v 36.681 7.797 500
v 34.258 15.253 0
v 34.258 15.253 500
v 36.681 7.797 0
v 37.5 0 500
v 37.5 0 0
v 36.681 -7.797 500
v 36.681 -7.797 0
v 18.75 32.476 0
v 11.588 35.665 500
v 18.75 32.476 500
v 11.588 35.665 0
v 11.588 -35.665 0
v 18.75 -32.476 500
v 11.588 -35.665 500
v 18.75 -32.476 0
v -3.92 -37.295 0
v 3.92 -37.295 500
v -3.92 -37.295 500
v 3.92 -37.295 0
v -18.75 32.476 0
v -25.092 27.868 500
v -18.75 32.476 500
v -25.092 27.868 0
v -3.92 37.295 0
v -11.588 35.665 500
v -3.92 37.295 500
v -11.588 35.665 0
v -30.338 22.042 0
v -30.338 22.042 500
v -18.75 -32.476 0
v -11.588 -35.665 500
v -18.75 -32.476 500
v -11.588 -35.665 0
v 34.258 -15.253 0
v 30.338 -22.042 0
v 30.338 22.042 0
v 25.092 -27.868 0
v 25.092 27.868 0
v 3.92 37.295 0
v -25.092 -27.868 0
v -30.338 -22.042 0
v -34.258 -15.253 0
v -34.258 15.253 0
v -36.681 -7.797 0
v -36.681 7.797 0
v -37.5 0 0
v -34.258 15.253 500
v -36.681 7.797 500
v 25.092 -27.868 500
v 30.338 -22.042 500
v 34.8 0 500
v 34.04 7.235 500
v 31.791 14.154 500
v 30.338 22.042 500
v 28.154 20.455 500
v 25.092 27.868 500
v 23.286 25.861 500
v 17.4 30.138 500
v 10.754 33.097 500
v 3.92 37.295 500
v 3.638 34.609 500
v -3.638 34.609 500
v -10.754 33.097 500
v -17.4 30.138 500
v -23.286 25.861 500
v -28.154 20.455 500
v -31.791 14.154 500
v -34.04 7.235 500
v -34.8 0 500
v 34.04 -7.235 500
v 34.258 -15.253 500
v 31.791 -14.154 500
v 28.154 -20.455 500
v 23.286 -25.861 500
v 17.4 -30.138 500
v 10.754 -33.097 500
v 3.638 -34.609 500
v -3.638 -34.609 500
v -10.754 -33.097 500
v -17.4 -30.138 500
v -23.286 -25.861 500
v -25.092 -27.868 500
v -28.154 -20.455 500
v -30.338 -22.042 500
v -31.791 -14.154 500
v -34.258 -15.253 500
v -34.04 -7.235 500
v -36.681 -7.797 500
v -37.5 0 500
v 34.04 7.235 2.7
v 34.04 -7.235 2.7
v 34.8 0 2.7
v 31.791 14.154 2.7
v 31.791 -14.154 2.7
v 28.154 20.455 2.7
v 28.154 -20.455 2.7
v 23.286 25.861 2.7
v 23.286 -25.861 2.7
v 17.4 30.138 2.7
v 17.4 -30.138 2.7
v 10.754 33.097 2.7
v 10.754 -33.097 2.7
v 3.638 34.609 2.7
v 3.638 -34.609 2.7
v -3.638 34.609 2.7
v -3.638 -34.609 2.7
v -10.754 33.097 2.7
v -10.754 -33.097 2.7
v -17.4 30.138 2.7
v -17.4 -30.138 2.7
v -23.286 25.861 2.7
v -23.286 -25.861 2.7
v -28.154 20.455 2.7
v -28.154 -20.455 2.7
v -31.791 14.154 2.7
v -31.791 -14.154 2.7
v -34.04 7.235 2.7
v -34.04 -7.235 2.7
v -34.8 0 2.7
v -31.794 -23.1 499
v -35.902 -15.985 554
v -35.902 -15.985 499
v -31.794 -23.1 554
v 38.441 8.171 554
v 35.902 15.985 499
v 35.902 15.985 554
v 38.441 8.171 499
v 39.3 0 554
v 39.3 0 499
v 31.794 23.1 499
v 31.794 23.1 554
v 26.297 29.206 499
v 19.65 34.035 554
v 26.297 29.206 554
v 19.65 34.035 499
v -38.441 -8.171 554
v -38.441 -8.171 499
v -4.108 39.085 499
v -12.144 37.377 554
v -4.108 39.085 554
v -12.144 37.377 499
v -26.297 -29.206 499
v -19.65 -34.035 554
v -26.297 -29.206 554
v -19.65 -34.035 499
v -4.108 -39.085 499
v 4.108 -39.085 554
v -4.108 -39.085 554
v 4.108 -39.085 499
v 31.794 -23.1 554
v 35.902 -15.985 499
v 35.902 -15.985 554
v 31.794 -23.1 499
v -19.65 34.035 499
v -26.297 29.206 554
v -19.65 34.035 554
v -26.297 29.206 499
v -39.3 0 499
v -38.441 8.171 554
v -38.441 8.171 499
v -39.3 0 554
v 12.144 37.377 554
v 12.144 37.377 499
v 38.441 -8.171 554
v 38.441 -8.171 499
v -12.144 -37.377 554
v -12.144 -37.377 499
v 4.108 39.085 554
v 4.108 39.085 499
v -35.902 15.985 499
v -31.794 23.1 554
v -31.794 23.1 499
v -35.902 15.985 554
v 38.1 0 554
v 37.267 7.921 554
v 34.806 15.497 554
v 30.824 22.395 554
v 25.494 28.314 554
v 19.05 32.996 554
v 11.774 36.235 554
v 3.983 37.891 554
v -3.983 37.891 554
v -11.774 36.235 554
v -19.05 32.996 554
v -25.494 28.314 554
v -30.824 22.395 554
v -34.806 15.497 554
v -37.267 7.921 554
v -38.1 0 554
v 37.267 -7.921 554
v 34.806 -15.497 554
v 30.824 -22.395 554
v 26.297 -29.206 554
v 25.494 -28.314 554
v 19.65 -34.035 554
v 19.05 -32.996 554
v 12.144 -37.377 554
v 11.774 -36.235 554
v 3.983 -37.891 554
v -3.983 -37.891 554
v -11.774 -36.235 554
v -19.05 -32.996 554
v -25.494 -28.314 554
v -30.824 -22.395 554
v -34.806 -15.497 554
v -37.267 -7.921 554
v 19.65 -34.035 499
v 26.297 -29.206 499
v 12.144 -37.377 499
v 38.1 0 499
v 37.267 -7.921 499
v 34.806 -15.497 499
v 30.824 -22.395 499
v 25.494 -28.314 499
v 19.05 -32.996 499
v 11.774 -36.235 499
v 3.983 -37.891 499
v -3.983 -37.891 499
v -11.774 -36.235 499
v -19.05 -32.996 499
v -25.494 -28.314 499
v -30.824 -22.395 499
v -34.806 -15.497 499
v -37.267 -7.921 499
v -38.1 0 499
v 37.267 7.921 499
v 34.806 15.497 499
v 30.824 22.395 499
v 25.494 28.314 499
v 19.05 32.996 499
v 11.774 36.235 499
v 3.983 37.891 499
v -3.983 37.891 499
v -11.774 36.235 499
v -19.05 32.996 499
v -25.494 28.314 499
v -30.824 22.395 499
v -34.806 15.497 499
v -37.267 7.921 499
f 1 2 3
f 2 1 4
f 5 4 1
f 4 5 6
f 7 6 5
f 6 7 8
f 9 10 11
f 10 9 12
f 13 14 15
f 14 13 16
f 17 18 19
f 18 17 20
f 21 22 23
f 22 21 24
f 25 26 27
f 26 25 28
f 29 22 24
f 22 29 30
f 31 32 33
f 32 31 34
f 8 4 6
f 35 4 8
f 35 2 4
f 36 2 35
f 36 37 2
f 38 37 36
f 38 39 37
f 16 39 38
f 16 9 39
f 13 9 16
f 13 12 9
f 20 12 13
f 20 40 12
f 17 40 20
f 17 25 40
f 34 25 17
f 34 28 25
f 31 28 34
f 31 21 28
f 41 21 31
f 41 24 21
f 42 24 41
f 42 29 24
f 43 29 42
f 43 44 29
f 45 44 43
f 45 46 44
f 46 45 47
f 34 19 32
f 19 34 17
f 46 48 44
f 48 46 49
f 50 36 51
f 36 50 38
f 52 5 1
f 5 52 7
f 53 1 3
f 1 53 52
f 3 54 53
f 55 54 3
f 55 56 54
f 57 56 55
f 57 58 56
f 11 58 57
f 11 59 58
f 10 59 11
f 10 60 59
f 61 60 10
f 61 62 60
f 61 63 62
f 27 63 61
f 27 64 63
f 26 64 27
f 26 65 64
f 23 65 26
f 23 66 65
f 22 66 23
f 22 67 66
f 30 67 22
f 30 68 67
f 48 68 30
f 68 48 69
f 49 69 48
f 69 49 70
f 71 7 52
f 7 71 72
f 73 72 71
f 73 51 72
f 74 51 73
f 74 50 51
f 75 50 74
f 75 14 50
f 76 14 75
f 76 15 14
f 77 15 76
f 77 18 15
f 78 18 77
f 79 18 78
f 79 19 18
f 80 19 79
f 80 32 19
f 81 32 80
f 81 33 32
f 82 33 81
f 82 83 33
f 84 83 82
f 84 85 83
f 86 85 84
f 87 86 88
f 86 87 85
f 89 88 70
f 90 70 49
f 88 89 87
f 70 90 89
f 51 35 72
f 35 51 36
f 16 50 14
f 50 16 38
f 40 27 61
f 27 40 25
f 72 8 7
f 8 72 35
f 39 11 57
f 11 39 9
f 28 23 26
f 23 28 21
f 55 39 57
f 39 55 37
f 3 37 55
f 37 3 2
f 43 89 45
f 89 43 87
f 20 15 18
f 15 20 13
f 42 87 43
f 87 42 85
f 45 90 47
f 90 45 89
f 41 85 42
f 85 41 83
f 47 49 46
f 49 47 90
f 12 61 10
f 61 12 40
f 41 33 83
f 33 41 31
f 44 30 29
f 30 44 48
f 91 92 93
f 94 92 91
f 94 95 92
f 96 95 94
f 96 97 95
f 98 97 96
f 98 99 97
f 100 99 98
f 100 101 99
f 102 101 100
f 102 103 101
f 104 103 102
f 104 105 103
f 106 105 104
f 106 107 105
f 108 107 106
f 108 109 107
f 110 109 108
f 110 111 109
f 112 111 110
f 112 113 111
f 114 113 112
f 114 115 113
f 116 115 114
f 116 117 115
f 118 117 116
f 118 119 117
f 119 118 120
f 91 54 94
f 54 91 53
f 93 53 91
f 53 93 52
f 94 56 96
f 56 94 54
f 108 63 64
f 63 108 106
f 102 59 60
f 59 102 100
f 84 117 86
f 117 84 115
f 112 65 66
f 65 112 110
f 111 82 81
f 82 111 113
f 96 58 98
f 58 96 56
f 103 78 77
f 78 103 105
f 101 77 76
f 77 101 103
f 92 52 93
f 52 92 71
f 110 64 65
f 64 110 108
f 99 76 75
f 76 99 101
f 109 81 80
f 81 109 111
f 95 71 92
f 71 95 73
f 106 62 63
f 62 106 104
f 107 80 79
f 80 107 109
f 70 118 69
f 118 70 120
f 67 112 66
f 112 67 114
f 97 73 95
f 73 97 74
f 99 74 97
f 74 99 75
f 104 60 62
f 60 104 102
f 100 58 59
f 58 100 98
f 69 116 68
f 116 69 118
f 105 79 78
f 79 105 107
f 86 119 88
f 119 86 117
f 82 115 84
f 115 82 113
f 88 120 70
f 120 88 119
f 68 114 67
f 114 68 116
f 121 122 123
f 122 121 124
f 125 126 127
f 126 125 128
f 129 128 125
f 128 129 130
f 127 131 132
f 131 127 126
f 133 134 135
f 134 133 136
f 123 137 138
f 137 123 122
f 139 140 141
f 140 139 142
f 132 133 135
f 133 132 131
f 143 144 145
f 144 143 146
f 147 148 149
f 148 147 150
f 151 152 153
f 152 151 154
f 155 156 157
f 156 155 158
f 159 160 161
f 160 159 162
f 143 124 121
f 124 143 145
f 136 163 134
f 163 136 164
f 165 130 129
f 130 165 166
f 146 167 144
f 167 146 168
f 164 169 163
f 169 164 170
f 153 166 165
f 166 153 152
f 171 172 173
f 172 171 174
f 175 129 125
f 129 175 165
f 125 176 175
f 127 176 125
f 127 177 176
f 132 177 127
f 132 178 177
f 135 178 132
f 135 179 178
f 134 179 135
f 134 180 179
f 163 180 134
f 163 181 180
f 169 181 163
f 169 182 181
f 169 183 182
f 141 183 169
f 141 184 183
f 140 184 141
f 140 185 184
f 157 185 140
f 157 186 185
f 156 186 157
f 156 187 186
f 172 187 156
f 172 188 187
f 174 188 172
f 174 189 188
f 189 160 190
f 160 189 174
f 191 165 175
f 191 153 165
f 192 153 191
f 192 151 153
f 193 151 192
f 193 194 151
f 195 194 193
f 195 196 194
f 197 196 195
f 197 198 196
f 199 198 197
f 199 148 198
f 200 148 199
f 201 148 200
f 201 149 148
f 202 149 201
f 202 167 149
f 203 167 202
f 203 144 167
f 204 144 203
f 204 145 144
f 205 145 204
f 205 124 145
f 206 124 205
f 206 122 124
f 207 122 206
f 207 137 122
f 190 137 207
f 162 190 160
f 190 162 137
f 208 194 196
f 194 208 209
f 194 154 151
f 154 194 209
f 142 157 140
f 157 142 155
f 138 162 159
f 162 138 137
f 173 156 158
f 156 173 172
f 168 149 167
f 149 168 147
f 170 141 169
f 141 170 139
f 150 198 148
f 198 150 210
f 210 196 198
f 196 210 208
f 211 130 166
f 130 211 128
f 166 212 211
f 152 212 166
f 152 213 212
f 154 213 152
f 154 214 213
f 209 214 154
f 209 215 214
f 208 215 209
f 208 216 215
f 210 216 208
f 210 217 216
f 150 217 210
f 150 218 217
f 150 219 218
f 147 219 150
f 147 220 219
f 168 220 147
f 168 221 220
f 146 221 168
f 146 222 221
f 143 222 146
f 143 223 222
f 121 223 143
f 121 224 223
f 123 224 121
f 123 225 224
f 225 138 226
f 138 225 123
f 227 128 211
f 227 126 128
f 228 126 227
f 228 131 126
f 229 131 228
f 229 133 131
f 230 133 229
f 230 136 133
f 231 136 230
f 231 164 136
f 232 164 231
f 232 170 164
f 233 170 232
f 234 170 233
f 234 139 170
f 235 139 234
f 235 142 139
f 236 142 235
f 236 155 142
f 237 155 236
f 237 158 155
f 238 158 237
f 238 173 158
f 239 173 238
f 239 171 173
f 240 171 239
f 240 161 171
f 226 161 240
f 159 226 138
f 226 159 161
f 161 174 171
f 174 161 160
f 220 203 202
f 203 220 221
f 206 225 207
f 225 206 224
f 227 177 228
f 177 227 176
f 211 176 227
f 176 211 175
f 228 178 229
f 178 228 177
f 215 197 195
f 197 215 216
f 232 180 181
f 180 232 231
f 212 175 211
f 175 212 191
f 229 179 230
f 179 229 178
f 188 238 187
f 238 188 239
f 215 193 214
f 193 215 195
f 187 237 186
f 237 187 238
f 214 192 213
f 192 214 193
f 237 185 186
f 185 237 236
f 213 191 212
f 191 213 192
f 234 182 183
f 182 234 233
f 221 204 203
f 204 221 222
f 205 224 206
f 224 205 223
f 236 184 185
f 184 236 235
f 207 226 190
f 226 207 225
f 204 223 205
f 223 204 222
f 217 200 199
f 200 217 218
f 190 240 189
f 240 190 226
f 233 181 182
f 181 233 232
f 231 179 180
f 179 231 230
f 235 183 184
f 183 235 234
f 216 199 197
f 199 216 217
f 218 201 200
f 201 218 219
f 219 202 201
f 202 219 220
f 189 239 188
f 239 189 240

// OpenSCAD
// Parameters
pipe_standard = 1; //[1:1:1]
nominal_diameter_mm = 75; //[40:160:1]
length_mm = 500; //[250:1000:1]
center = 0; //[0:1:1]
pipe_od = 75; //[40:160:1]
pipe_wall = 2.7; //[1.5:6:0.1]
socket_length = 55; //[30:120:1]
socket_wall_extra = 1.8; //[0.5:5:0.1]
socket_clearance = 0.6; //[0.2:1.5:0.1]
connect_overlap = 1; //[0.5:2:0.1]

// Module for HT Pipe
module ht_pipe() {
  color([0.85, 0.85, 0.8]) { // PVC color
    // Pipe body
    difference() {
      cylinder(r=pipe_od/2, h=length_mm, center=false);
      translate([0, 0, pipe_wall])
        cylinder(r=pipe_od/2 - pipe_wall, h=length_mm, center=false);
    }
    
    // End fitting socket
    difference() {
      translate([0, 0, length_mm - connect_overlap])
        cylinder(r=pipe_od/2 + socket_wall_extra, h=socket_length, center=false);
      translate([0, 0, length_mm - connect_overlap])
        cylinder(r=pipe_od/2 + socket_clearance, h=socket_length, center=false);
    }
  }
}

// Assembly
module assembly() {
  ht_pipe();
}

assembly();
